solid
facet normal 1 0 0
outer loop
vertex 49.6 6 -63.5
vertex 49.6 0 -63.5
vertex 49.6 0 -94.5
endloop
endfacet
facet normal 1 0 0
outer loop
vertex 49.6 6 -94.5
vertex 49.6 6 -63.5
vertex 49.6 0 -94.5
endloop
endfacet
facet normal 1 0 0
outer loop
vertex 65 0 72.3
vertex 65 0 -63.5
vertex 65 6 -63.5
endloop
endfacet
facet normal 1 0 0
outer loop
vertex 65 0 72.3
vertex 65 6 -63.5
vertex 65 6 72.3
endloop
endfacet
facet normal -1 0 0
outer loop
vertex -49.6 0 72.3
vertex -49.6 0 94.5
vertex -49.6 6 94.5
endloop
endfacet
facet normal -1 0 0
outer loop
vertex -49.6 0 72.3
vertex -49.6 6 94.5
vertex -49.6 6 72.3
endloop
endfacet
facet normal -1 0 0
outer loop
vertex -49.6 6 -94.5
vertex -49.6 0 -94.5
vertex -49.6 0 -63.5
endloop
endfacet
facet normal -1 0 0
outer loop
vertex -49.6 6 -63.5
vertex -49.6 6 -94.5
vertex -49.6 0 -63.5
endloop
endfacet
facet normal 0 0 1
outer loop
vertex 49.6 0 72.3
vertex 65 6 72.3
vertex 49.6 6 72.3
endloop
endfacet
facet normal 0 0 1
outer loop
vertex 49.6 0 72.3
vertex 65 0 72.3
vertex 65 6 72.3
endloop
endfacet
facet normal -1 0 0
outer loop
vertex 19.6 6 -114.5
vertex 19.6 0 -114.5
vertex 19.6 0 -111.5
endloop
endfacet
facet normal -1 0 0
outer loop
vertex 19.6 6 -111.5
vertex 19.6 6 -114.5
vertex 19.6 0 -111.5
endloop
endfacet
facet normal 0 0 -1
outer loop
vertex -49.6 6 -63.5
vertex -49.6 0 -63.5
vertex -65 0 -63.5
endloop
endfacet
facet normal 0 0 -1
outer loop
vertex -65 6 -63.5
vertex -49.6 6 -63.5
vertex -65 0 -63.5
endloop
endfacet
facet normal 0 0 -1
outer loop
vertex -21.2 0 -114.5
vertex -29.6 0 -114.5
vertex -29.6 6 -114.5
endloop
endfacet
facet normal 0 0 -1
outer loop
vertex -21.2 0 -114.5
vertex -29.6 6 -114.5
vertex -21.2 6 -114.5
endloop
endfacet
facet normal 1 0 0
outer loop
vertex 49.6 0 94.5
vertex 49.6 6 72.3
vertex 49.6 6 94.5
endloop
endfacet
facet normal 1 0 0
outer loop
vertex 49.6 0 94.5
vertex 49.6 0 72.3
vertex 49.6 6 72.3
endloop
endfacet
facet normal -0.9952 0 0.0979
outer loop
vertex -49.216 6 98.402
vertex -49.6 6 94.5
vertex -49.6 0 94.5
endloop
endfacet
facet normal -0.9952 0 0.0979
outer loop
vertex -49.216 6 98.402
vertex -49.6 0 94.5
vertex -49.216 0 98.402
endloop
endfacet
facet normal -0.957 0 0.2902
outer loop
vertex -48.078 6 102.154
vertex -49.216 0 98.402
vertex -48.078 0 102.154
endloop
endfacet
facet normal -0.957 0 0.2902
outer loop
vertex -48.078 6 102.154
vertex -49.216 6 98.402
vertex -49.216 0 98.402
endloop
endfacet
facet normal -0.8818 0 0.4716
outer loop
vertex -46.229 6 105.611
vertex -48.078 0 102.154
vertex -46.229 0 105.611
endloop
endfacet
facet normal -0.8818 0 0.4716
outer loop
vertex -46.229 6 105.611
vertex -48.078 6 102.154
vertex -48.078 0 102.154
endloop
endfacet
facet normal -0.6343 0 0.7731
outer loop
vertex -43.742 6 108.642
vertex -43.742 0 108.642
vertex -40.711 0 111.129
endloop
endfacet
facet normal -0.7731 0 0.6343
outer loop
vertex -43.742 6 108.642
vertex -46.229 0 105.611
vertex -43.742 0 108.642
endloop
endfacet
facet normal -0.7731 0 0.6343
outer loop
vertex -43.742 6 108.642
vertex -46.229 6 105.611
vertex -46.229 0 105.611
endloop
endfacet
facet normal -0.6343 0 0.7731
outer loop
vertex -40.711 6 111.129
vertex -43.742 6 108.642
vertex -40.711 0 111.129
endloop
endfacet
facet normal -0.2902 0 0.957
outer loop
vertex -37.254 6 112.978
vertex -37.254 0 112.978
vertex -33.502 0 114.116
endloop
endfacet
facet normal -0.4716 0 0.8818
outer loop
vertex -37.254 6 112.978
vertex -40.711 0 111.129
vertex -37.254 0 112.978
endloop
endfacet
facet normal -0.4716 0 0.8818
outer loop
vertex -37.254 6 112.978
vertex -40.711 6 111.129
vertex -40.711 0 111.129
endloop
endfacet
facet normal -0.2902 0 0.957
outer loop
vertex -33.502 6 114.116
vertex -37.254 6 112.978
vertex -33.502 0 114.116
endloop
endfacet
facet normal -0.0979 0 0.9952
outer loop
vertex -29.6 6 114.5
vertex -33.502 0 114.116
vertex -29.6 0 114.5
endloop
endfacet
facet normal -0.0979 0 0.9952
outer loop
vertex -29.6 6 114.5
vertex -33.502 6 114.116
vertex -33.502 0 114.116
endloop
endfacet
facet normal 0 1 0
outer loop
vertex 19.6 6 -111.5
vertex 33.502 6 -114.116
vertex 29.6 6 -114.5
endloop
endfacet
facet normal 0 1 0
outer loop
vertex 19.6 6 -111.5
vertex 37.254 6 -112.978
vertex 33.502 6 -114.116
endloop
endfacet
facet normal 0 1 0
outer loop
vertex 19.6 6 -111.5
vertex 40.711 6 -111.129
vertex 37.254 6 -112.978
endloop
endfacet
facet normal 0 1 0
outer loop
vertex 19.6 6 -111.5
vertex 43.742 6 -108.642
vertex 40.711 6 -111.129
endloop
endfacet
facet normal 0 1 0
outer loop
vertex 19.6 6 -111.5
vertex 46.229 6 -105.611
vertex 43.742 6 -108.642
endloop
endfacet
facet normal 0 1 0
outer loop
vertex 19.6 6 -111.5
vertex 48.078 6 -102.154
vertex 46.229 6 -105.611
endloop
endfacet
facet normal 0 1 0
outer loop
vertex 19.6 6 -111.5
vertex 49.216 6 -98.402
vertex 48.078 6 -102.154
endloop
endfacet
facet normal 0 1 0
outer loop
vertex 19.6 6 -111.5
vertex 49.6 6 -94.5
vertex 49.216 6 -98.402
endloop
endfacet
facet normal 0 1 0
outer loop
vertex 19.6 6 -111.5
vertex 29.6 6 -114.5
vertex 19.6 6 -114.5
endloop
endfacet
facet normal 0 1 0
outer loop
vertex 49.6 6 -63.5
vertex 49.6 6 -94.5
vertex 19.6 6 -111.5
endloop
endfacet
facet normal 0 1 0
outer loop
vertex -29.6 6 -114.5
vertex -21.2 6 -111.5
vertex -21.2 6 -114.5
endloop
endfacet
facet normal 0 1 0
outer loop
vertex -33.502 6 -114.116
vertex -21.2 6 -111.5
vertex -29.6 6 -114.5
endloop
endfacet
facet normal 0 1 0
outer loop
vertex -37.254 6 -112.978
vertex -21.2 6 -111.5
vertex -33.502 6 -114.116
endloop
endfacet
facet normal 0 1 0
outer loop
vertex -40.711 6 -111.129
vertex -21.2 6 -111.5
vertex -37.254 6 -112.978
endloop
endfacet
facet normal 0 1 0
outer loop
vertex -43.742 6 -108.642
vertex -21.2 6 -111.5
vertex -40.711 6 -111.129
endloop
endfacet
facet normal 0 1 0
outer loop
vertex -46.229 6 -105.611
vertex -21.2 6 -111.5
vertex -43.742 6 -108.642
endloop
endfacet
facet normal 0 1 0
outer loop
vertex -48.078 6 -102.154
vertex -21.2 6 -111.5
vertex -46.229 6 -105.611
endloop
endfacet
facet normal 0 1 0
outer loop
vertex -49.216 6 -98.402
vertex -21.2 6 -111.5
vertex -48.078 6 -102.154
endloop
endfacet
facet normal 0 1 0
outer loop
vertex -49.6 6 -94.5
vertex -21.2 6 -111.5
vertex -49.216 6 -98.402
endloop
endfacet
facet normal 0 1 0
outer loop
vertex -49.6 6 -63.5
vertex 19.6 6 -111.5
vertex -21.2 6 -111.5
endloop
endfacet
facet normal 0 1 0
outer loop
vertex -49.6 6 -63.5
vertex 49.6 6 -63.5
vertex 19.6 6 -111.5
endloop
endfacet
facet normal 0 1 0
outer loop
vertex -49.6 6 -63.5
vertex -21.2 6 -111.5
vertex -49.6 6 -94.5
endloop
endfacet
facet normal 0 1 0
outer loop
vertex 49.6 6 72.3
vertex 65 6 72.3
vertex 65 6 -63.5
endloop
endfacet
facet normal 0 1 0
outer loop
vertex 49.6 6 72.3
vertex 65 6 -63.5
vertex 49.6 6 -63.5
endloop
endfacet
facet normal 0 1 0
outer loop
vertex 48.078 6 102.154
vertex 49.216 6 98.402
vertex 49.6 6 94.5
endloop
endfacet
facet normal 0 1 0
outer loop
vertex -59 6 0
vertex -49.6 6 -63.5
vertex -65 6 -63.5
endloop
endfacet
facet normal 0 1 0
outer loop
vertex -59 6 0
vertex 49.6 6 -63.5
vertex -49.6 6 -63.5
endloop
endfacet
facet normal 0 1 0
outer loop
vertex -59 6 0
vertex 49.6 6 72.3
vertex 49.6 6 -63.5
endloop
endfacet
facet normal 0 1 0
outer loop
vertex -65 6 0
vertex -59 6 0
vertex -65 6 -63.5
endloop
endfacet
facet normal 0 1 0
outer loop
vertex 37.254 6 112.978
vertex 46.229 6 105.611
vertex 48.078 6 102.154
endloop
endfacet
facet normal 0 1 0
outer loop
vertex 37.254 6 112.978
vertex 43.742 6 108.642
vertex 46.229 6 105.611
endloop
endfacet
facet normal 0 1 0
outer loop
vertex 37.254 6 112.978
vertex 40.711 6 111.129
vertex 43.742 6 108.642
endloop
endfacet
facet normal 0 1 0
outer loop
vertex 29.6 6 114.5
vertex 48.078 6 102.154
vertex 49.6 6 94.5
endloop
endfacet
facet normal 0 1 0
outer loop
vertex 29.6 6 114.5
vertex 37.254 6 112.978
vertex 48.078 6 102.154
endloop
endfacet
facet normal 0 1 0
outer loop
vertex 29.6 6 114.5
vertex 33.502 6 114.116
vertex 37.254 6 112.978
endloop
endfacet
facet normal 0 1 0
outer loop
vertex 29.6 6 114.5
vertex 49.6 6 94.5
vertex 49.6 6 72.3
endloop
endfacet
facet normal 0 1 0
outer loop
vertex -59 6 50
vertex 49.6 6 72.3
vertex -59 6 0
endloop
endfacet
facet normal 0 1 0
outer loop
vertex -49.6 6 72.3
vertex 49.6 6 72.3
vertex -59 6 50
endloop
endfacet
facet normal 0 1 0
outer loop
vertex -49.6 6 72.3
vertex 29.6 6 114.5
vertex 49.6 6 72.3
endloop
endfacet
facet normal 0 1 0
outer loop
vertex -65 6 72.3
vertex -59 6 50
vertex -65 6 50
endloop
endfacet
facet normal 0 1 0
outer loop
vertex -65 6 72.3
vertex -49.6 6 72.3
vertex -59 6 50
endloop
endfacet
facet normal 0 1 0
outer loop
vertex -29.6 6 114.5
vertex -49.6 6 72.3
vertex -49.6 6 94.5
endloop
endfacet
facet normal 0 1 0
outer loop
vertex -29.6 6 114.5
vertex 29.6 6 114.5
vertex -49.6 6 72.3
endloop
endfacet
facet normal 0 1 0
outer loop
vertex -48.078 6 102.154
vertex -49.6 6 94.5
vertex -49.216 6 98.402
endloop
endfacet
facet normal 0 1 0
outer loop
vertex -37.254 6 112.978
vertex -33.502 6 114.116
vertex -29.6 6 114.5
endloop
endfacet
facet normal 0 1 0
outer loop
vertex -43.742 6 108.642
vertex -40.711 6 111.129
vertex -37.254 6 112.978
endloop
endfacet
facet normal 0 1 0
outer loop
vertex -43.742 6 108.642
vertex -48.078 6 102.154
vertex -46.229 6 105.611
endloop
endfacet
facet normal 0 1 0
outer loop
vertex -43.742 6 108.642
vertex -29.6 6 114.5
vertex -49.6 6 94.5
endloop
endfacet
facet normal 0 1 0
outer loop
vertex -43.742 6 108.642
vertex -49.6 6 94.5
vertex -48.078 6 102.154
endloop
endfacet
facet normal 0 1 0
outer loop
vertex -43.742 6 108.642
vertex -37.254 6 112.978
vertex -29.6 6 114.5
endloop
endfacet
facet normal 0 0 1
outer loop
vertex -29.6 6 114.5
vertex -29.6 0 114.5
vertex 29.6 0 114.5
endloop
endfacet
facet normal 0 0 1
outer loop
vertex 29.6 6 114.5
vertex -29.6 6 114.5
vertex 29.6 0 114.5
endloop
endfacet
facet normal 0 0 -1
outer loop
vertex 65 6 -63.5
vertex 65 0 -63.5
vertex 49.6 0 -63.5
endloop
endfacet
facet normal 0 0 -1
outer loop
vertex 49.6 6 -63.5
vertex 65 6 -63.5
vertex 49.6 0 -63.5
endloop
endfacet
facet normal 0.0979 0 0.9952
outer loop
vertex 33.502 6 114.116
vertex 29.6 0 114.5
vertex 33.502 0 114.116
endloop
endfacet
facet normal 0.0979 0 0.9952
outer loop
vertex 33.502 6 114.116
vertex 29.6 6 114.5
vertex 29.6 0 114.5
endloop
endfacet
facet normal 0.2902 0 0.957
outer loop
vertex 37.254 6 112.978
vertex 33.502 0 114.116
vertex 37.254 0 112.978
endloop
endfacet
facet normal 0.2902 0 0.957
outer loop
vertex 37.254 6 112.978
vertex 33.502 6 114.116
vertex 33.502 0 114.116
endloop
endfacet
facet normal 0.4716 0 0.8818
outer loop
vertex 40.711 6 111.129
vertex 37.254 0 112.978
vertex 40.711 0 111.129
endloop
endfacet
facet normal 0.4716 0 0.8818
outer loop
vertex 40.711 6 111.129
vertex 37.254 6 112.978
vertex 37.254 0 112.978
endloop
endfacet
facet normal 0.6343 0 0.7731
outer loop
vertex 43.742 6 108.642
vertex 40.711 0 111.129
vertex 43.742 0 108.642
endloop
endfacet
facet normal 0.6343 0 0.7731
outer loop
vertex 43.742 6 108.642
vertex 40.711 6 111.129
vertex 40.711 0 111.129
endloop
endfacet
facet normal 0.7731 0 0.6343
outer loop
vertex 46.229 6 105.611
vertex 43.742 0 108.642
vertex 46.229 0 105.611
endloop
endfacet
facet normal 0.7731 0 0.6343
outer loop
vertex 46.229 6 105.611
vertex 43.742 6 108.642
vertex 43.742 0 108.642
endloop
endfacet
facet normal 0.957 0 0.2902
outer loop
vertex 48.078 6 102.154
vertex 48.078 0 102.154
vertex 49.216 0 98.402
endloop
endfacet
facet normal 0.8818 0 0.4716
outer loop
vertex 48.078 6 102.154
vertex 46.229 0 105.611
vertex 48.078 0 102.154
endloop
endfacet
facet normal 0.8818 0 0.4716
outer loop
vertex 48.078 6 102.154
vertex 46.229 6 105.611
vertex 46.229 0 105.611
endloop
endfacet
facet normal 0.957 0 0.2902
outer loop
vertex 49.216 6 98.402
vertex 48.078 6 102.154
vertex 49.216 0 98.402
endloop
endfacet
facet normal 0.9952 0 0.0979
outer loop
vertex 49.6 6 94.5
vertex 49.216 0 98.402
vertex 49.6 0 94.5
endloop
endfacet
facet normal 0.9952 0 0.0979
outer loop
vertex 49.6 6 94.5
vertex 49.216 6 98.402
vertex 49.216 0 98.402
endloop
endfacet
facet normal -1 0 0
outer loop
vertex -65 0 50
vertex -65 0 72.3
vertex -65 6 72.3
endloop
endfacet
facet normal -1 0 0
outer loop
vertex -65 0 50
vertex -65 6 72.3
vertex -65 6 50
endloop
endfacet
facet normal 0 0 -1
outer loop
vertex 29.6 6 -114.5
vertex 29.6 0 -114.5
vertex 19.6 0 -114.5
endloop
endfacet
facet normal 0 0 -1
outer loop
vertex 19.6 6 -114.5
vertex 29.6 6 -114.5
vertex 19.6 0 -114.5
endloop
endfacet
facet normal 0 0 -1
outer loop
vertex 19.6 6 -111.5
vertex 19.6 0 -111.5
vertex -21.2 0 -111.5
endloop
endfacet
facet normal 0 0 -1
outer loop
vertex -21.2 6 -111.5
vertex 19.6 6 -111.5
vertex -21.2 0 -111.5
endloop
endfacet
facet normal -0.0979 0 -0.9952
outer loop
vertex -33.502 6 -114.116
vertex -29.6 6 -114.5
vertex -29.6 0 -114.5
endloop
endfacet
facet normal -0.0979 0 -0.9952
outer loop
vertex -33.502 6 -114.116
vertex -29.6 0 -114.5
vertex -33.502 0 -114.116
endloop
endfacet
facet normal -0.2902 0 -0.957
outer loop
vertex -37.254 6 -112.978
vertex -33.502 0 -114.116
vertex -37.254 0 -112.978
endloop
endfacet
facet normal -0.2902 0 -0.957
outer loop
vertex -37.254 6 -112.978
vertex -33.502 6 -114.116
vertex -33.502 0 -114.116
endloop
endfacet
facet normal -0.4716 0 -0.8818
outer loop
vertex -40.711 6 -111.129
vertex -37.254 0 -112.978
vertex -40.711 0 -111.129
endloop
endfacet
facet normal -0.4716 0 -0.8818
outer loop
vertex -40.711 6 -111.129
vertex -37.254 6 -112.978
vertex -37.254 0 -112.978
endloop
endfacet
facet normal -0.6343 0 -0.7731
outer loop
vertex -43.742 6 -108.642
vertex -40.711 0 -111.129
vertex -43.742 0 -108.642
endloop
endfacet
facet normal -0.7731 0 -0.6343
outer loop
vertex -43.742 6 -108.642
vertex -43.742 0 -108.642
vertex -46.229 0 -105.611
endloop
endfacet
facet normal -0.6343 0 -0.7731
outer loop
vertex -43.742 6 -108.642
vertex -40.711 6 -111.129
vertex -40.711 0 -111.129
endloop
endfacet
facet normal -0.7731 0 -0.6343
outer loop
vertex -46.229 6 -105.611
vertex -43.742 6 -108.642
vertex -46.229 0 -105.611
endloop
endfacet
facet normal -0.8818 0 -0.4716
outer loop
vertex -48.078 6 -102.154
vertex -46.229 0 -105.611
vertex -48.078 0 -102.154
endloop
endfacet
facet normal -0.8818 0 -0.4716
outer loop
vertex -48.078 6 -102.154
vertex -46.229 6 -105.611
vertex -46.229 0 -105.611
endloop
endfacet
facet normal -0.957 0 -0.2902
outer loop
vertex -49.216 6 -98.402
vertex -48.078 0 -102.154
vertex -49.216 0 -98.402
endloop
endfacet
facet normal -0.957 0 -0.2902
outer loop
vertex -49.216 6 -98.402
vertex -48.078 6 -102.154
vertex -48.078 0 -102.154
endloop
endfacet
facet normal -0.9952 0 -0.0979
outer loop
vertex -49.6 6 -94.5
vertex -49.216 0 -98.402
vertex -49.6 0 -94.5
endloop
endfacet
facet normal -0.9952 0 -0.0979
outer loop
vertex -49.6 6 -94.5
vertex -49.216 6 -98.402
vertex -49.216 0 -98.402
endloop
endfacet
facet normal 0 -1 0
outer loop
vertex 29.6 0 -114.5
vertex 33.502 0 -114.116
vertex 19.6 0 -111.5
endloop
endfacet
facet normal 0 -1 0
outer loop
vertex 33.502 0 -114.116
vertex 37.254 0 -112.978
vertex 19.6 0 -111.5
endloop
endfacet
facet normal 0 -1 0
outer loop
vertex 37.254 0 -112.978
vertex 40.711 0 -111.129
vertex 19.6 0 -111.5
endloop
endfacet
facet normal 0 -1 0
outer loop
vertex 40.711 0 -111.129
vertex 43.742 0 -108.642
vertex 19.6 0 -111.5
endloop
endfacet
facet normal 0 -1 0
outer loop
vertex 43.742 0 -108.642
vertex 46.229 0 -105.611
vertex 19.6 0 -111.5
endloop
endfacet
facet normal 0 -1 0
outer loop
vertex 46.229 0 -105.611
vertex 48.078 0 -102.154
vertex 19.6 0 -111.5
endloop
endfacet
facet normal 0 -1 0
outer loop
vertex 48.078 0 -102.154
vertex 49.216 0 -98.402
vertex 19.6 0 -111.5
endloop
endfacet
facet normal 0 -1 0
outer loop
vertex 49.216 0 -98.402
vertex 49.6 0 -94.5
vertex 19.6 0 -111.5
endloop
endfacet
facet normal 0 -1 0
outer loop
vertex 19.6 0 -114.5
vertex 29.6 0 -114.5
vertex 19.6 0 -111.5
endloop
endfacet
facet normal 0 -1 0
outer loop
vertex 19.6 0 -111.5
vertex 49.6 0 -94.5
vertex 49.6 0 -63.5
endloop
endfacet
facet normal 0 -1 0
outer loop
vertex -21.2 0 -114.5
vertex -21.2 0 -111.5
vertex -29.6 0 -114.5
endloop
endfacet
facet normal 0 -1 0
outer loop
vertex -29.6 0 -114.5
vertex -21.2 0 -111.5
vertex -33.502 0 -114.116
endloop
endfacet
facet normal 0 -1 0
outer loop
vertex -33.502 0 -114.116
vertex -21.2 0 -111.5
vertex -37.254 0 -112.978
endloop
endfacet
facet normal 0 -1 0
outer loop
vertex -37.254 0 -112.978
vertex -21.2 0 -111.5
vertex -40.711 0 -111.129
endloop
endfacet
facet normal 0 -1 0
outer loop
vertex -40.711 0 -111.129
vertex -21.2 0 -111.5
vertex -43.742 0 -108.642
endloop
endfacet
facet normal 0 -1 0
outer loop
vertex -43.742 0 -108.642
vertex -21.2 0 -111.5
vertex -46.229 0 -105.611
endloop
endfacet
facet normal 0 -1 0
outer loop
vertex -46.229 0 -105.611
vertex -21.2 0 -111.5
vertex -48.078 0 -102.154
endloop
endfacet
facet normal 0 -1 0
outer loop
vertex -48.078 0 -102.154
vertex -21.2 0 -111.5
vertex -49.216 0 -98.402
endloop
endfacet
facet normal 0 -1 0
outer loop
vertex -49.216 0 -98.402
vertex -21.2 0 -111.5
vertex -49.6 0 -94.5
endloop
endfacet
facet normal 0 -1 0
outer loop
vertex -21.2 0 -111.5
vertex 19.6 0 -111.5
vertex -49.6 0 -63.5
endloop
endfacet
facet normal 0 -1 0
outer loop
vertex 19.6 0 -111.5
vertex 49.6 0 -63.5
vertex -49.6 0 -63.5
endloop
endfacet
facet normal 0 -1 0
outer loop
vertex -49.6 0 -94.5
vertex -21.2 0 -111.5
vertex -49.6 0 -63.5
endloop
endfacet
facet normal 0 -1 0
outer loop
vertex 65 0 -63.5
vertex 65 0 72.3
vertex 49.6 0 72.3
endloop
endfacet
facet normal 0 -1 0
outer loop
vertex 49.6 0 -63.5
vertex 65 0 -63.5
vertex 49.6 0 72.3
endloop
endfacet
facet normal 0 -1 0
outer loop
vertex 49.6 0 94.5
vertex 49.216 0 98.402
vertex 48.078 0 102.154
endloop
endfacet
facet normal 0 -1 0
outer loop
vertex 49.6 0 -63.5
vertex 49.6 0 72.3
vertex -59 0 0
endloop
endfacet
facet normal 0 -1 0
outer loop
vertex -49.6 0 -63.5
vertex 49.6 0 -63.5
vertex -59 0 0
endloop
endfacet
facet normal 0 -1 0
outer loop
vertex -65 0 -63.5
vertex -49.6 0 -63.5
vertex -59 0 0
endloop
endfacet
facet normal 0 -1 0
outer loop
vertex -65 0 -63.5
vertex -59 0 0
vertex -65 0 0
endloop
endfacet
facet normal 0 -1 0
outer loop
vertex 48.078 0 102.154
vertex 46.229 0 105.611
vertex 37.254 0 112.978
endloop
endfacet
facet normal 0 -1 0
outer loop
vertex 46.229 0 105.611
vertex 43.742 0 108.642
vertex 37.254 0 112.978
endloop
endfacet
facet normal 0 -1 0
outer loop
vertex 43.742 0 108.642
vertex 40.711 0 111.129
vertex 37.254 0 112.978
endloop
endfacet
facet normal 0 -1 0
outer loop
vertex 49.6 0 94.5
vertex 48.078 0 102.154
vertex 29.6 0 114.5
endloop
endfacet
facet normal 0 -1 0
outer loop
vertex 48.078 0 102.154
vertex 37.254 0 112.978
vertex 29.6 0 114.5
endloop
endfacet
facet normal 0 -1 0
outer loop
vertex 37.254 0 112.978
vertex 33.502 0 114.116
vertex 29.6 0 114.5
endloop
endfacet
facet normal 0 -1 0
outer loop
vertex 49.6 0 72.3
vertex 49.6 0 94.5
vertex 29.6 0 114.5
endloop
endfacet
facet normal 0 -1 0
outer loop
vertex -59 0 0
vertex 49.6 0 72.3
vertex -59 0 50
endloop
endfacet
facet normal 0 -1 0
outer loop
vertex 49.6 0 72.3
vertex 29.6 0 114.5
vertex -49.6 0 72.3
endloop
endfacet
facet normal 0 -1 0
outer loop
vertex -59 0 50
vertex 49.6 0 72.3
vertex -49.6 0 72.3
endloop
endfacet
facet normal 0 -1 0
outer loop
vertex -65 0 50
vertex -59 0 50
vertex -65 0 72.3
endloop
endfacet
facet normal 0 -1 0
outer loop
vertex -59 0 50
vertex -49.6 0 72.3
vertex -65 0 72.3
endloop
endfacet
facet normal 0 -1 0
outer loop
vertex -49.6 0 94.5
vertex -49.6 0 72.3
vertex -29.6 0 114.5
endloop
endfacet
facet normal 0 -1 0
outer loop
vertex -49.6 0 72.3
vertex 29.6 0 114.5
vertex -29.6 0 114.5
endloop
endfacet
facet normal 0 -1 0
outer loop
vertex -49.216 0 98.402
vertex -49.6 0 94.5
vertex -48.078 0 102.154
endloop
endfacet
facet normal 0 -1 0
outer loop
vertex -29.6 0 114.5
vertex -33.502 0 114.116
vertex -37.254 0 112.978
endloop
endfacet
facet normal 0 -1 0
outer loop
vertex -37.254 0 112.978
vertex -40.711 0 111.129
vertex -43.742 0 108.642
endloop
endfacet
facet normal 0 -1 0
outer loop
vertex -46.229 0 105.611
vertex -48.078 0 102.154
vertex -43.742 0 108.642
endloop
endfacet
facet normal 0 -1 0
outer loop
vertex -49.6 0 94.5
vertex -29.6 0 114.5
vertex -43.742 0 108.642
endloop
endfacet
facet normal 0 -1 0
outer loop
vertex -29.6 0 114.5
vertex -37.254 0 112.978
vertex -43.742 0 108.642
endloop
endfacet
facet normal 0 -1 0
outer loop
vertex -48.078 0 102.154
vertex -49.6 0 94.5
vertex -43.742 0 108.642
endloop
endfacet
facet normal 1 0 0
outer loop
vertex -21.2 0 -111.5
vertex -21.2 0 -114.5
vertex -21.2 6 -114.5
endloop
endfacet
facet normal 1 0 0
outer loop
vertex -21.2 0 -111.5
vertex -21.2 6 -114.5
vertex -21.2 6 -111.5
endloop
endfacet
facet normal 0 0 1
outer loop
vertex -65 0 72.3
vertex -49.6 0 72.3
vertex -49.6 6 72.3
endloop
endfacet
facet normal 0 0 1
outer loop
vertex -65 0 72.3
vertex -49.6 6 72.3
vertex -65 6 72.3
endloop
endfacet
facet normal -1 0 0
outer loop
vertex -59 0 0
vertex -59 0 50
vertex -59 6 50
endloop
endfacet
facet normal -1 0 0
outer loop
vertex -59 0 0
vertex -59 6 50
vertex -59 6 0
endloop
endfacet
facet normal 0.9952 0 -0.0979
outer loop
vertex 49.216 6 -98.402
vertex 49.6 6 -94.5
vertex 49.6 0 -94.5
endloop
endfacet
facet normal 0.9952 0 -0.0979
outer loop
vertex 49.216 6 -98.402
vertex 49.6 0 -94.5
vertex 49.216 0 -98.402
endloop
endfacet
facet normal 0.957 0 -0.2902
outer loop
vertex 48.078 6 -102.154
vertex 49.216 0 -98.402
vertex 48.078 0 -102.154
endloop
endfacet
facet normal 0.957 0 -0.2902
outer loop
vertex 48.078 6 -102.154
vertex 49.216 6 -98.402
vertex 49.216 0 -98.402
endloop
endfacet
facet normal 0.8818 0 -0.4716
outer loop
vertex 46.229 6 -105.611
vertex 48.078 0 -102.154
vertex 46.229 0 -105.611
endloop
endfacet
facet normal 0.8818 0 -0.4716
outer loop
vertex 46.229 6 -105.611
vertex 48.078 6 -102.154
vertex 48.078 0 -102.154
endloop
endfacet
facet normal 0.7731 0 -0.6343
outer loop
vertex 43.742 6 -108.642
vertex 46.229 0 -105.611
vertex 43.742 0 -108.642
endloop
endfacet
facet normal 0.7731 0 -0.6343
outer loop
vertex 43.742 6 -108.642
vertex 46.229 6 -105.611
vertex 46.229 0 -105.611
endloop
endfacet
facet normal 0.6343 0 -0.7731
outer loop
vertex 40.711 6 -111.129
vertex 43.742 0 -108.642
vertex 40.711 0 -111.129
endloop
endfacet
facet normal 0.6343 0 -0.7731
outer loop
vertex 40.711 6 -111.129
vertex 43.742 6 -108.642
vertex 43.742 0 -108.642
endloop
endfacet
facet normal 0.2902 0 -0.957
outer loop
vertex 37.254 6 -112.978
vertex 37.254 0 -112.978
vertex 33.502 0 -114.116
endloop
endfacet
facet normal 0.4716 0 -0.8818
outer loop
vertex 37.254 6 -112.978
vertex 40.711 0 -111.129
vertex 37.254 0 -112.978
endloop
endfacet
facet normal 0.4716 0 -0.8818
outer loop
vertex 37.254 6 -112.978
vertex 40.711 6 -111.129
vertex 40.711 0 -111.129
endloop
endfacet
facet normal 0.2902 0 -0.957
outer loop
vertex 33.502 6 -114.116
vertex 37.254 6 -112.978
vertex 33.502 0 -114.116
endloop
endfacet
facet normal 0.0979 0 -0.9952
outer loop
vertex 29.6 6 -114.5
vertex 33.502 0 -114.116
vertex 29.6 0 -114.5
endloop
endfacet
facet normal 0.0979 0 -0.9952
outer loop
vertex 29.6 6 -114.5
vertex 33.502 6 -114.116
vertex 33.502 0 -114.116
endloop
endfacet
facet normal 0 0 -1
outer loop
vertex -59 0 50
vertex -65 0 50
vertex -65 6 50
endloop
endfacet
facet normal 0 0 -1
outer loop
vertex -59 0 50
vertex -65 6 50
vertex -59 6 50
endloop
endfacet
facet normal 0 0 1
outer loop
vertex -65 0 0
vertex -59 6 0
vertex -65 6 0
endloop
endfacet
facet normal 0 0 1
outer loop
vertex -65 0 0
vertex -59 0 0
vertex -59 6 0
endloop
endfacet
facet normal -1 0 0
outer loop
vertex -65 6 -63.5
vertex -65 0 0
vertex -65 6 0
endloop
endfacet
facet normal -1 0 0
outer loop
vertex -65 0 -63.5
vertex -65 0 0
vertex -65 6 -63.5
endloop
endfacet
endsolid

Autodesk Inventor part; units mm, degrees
ref_plane "YZ Plane" through (0, 0, 0) normal (1, 0, 0) x (0, 1, 0)
ref_plane "XZ Plane" through (0, 0, 0) normal (0, 1, 0) x (-1, 0, 0)
ref_plane "XY Plane" through (0, 0, 0) normal (0, 0, 1) x (1, 0, 0)
sketch "Sketch1" plane through (0, 0, 0) normal (0, 1, 0) x (-1, 0, 0)
  line L0 (49.6, -114.5) -> (49.6, -63.5)
  line L1 (49.6, -63.5) -> (65, -63.5)
  line L2 (-65, -63.5) -> (-49.6, -63.5)
  line L3 (-49.6, -63.5) -> (-49.6, -114.5)
  line L4 (-65, 72.3) -> (-49.6, 72.3)
  line L5 (-65, -63.5) -> (-65, 72.3)
  line L6 (-49.6, 72.3) -> (-49.6, 114.5)
  line L7 (49.6, 114.5) -> (49.6, 72.3)
  line L8 (49.6, 72.3) -> (65, 72.3)
  line L9 (49.6, 114.5) -> (-49.6, 114.5)
  line L10 (49.6, -114.5) -> (21.2, -114.5)
  line L11 (21.2, -114.5) -> (21.2, -111.5)
  line L12 (-49.6, -114.5) -> (-19.6, -114.5)
  line L13 (-19.6, -114.5) -> (-19.6, -111.5)
  line L14 (-19.6, -111.5) -> (21.2, -111.5)
  line L15 (65, 72.3) -> (65, 50)
  line L16 (65, 50) -> (59, 50)
  line L17 (59, 50) -> (59, 0)
  line L18 (59, 0) -> (65, 0)
  line L19 (65, 0) -> (65, -63.5)
  point P0 (0, 0)
  dimension "d3" = 51
  dimension "d5" = 15.4
  dimension "d8" = 15.4
  dimension "d10" = 42.2
  dimension "d11" = 28.4
  dimension "d13" = 30
  dimension "d14" = 3
  dimension "d15" = 40.8
  dimension "d16" = 22.3
  dimension "d17" = 6
  dimension "d18" = 50
extrude "Extrusion1" add sketch "Sketch1" along normal blind 6
fillet "Fillet1" radius 20 4 edges at (49.6, 3, -114.5) (-49.6, 3, -114.5) (49.6, 3, 114.5) (-49.6, 3, 114.5)
properties part number "kryt_v1,1"
